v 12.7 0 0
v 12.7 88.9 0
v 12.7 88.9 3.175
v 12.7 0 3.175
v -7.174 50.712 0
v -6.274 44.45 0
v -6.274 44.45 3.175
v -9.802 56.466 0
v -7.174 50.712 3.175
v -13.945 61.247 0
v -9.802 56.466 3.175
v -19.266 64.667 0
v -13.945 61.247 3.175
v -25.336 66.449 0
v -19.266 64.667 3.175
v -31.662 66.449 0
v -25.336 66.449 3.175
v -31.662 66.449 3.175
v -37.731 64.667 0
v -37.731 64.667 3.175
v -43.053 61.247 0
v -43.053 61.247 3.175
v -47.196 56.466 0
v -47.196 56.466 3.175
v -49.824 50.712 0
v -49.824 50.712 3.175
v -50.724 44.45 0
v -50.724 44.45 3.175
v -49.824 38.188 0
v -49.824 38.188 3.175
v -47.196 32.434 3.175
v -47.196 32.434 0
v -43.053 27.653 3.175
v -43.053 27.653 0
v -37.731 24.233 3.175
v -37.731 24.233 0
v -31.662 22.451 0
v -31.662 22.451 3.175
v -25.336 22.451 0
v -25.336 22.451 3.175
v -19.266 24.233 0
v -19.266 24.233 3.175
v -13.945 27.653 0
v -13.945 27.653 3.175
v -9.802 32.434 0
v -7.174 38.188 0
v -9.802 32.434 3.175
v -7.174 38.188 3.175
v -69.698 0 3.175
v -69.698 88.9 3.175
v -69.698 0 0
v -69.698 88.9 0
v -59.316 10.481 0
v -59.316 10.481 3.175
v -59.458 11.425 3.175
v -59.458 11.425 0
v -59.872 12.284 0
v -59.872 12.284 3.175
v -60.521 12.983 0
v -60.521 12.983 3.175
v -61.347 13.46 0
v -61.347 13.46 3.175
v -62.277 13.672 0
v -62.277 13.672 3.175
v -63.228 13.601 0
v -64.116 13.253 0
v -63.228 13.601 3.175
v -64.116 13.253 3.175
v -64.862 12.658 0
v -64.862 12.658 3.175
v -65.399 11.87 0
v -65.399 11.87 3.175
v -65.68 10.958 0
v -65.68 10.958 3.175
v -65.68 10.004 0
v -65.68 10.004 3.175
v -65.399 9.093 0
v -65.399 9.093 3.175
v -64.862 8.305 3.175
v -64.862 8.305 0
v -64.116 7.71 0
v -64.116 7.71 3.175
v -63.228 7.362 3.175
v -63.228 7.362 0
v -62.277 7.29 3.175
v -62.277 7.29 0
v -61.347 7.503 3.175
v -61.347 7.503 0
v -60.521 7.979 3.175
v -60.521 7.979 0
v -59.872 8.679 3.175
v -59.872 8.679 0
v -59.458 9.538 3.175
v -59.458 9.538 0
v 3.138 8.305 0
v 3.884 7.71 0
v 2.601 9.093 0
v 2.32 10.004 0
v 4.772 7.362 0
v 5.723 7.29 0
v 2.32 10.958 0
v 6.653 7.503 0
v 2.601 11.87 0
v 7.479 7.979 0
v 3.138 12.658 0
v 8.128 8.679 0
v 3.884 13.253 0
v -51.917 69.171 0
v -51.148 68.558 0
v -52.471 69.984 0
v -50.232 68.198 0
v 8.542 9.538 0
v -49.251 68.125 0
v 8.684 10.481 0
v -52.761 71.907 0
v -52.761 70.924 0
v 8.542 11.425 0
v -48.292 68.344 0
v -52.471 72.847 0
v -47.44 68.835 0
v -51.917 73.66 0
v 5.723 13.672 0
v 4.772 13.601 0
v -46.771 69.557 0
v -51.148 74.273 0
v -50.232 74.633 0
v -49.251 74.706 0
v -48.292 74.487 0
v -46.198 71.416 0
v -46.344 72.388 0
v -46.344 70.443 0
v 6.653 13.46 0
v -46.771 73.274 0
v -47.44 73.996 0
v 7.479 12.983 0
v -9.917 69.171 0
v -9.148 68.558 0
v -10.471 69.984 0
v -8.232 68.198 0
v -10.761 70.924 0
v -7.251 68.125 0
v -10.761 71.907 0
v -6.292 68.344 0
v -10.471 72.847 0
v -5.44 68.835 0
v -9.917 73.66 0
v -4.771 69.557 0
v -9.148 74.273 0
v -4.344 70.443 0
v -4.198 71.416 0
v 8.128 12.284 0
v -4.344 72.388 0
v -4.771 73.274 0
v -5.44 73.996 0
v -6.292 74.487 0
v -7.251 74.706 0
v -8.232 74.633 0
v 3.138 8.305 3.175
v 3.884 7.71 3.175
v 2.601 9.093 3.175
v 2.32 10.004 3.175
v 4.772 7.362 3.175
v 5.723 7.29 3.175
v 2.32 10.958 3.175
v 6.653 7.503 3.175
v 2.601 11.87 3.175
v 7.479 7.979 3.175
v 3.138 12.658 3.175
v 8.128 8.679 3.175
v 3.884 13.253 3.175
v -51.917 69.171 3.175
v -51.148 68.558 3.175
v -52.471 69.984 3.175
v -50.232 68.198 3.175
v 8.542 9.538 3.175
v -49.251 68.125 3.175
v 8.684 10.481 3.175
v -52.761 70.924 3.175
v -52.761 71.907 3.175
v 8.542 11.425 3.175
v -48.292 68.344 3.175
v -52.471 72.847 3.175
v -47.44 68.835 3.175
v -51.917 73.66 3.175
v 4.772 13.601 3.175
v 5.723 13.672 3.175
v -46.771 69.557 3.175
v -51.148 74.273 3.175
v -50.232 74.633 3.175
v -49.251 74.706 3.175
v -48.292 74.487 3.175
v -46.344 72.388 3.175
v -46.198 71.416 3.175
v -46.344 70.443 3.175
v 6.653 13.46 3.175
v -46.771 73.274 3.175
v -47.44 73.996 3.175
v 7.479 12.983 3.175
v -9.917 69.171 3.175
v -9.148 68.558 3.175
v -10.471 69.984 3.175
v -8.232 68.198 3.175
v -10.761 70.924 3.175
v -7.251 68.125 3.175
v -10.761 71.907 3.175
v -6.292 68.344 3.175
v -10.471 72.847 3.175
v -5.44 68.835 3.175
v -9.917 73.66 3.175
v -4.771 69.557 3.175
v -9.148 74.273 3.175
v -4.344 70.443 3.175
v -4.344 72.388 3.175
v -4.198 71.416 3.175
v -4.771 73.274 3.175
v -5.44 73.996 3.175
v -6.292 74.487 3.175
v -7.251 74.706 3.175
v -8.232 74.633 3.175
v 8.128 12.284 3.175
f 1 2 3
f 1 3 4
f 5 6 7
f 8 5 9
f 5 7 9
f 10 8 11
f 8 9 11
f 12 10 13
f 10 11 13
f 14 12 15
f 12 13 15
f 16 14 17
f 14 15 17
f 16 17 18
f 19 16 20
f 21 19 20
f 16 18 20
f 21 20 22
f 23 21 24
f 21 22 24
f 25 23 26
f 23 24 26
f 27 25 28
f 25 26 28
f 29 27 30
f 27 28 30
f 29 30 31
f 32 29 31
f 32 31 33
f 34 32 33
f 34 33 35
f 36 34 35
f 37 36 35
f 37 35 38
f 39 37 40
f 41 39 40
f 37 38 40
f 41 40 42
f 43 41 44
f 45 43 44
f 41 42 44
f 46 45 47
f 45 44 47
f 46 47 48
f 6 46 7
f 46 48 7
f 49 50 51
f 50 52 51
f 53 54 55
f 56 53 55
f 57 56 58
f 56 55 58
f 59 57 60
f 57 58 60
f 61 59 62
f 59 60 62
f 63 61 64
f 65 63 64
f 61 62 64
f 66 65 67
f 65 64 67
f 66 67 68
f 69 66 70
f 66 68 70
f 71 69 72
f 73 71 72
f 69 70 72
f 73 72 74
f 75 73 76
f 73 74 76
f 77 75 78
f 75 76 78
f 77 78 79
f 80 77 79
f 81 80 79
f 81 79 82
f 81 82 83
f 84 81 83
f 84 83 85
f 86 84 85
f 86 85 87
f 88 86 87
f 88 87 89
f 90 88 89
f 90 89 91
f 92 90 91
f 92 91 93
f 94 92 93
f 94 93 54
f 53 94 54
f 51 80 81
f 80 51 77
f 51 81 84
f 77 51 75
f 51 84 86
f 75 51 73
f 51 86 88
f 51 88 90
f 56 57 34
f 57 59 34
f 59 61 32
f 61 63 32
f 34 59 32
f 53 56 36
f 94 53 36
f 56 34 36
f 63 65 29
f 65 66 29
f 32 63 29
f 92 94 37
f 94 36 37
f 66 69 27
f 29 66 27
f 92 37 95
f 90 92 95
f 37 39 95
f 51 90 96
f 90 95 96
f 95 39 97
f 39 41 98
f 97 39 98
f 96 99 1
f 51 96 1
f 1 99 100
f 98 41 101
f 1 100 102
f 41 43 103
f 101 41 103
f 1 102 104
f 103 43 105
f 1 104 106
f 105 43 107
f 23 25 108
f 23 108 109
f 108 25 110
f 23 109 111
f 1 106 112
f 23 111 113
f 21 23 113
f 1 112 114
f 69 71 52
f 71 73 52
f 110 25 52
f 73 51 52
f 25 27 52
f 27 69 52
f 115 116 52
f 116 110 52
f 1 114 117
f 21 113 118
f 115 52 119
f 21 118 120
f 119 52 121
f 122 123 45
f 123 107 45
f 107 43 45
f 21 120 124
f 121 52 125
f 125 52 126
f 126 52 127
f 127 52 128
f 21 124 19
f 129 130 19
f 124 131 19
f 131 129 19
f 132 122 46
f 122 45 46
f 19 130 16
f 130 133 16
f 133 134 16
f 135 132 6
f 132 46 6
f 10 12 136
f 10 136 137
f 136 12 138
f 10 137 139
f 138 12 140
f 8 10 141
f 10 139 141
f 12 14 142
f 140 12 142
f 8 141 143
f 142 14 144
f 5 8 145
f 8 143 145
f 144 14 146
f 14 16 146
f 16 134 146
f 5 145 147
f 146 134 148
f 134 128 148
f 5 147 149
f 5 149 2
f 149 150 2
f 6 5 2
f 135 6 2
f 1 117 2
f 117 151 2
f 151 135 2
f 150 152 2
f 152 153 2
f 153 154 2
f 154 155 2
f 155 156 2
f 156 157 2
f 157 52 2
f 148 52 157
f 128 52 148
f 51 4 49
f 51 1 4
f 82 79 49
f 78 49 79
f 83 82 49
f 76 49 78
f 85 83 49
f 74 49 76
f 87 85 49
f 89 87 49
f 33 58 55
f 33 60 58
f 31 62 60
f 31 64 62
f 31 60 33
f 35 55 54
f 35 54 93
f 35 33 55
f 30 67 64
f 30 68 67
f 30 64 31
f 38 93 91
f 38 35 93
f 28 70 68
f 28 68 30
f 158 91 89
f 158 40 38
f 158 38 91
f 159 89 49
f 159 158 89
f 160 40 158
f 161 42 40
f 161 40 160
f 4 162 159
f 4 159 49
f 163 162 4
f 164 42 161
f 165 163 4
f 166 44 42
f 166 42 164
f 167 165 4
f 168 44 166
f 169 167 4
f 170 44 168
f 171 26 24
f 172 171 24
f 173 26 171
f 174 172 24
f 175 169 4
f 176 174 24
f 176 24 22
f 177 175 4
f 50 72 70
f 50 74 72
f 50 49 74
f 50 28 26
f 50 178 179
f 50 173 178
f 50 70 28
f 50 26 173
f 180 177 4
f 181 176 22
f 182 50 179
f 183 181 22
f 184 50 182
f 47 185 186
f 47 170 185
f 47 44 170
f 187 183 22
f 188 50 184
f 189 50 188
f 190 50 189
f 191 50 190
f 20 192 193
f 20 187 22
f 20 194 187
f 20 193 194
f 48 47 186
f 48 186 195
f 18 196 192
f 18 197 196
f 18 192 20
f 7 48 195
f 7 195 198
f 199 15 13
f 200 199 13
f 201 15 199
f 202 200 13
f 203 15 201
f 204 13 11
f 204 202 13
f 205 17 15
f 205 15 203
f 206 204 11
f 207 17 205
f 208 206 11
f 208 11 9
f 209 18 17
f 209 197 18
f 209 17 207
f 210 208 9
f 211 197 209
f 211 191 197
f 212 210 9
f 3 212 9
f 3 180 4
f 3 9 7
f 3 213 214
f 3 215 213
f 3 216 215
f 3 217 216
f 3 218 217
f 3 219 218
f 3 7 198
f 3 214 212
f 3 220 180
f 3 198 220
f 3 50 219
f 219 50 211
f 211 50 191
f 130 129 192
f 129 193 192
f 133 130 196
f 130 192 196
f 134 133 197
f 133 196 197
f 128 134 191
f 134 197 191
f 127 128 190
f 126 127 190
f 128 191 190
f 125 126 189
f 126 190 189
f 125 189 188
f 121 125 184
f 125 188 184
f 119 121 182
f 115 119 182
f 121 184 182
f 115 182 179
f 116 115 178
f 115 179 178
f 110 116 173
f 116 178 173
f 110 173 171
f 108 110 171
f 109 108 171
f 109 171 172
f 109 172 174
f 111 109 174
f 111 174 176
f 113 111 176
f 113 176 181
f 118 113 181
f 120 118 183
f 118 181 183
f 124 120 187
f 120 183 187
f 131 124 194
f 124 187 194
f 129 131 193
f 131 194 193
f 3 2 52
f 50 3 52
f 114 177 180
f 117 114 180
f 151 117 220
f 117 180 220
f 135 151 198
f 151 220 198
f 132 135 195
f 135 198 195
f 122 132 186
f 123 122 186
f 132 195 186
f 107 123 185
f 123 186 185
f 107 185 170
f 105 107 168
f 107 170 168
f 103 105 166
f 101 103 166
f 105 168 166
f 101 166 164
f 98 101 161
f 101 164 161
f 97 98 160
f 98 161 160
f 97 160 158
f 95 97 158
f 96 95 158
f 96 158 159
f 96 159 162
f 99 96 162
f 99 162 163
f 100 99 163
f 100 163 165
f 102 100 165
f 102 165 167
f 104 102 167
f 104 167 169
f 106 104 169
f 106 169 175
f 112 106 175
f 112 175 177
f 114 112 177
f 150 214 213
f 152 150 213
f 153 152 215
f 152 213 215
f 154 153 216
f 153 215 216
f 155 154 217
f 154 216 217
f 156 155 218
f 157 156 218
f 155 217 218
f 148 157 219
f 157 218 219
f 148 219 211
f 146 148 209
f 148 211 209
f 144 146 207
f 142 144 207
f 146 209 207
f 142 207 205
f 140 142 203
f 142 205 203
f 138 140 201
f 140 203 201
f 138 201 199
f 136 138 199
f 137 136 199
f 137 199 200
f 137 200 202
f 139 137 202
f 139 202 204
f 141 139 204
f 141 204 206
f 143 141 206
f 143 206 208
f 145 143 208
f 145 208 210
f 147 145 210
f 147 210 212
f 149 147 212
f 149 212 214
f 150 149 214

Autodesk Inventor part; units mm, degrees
ref_plane "YZ Plane" through (0, 0, 0) normal (1, 0, 0) x (0, 1, 0)
ref_plane "XZ Plane" through (0, 0, 0) normal (0, 1, 0) x (-1, 0, 0)
ref_plane "XY Plane" through (0, 0, 0) normal (0, 0, 1) x (1, 0, 0)
sketch "Sketch1" plane through (0, 0, 0) normal (0, 0, 1) x (1, 0, 0)
  line L0 (0, 0) -> (-56.9976, 0)
  line L1 (-56.9976, 88.9) -> (0, 88.9)
  line L2 (0, 88.9) -> (-7.493, 88.9)
  line L3 (-7.493, 88.9) -> (-7.493, 82.55)
  line L4 (-56.9976, 88.9) -> (-49.5046, 88.9)
  line L5 (-49.5046, 88.9) -> (-49.5046, 82.55)
  line L6 (-56.9976, 88.9) -> (-69.6976, 88.9)
  line L7 (-69.6976, 88.9) -> (-69.6976, 0)
  line L8 (-69.6976, 0) -> (-56.9976, 0)
  line L9 (0, 88.9) -> (8.89, 88.9)
  line L10 (8.89, 0) -> (0, 0)
  line L11 (0, 88.9) -> (12.7, 88.9)
  line L12 (12.7, 88.9) -> (12.7, 0)
  line L13 (12.7, 0) -> (0, 0)
  dimension "d1" = 56.9976
  dimension "d2" = 88.9
  dimension "d3" = 7.493
  dimension "d4" = 6.35
  dimension "d5" = 7.493
  dimension "d19" = 6.35
  dimension "d48" = 12.7
  dimension "d57" = 12.7
extrude "Plate5" add sketch "Sketch1" along normal blind 3.175
sketch "Sketch7" plane through (12.7, 0, 0) normal (1, 0, 0) x (0, 0, -1)
  line L0 (-3.175, 88.9) -> (-3.175, 0) projected
  line L1 (0, 0) -> (-3.175, 0) projected
  line L2 (0, 0) -> (0, 88.9) projected
  line L3 (0, 88.9) -> (-3.175, 88.9) projected
sketch "Sketch11" plane through (0, 0, 3.175) normal (0, 0, 1) x (1, 0, 0)
  circle A0 centre (-7.4976, 71.4155) radius 3.3
  circle A1 centre (-49.4976, 71.4155) radius 3.3
  circle A2 centre (5.484, 10.4813) radius 3.2
  line L0 (-11.9976, 581.6155) -> (-11.9976, -78.7845)
  circle A3 centre (5.484, 10.4813) radius 3.2
  line L1 (-53.516, -9.5187) -> (-68.516, -9.5187)
  line L2 (-68.516, 30.4813) -> (-68.516, -9.5187)
  line L3 (-68.516, 30.4813) -> (-53.516, 30.4813)
  line L4 (-53.516, 30.4813) -> (-53.516, -9.5187)
  circle A4 centre (-62.516, 10.4813) radius 3.2
  circle A5 centre (-62.516, 10.4813) radius 3.2
  point P0 (0, 0)
  point P1 (-28.516, 7.2815)
extrude "Cut5" cut sketch "Sketch11" against normal blind 3.175 contours A0 | A1 | A2 | A4
sketch "Sketch12" plane through (0, 0, 3.175) normal (0, 0, 1) x (1, 0, 0)
  line L0 (-69.6976, 88.9) -> (12.7, 88.9) projected
  line L1 (-69.6976, 0) -> (-69.6976, 88.9) projected
  line L2 (-28.4988, 88.9) -> (-28.4988, 44.45)
  circle A0 centre (-28.4988, 44.45) radius 22.225
  point P0 (0, 0)
  dimension "d71" = 44.45
extrude "Cut6" cut sketch "Sketch12" against normal blind 3.175
equation "\"d69\" = Thickness"
equation "\"d72\" = Thickness"
equation "\"BendRadius\" = Thickness"
equation "\"BendReliefWidth\" = Thickness"
equation "\"BendReliefDepth\" = 0.5 * Thickness"
equation "\"CornerReliefSize\" = 4 * Thickness"
equation "\"MinimumRemnant\" = 2 * Thickness"
equation "\"TransitionRadius\" = BendRadius"
equation "\"JacobiRadiusSize\" = BendRadius"
equation "\"GapSize\" = Thickness"
equation "\"d8\" = BendRadius"
equation "\"d56\" = BendRadius"
equation "\"Thickness\" = 3.175"
properties part number "upper face mount" material "Aluminum 6061"
